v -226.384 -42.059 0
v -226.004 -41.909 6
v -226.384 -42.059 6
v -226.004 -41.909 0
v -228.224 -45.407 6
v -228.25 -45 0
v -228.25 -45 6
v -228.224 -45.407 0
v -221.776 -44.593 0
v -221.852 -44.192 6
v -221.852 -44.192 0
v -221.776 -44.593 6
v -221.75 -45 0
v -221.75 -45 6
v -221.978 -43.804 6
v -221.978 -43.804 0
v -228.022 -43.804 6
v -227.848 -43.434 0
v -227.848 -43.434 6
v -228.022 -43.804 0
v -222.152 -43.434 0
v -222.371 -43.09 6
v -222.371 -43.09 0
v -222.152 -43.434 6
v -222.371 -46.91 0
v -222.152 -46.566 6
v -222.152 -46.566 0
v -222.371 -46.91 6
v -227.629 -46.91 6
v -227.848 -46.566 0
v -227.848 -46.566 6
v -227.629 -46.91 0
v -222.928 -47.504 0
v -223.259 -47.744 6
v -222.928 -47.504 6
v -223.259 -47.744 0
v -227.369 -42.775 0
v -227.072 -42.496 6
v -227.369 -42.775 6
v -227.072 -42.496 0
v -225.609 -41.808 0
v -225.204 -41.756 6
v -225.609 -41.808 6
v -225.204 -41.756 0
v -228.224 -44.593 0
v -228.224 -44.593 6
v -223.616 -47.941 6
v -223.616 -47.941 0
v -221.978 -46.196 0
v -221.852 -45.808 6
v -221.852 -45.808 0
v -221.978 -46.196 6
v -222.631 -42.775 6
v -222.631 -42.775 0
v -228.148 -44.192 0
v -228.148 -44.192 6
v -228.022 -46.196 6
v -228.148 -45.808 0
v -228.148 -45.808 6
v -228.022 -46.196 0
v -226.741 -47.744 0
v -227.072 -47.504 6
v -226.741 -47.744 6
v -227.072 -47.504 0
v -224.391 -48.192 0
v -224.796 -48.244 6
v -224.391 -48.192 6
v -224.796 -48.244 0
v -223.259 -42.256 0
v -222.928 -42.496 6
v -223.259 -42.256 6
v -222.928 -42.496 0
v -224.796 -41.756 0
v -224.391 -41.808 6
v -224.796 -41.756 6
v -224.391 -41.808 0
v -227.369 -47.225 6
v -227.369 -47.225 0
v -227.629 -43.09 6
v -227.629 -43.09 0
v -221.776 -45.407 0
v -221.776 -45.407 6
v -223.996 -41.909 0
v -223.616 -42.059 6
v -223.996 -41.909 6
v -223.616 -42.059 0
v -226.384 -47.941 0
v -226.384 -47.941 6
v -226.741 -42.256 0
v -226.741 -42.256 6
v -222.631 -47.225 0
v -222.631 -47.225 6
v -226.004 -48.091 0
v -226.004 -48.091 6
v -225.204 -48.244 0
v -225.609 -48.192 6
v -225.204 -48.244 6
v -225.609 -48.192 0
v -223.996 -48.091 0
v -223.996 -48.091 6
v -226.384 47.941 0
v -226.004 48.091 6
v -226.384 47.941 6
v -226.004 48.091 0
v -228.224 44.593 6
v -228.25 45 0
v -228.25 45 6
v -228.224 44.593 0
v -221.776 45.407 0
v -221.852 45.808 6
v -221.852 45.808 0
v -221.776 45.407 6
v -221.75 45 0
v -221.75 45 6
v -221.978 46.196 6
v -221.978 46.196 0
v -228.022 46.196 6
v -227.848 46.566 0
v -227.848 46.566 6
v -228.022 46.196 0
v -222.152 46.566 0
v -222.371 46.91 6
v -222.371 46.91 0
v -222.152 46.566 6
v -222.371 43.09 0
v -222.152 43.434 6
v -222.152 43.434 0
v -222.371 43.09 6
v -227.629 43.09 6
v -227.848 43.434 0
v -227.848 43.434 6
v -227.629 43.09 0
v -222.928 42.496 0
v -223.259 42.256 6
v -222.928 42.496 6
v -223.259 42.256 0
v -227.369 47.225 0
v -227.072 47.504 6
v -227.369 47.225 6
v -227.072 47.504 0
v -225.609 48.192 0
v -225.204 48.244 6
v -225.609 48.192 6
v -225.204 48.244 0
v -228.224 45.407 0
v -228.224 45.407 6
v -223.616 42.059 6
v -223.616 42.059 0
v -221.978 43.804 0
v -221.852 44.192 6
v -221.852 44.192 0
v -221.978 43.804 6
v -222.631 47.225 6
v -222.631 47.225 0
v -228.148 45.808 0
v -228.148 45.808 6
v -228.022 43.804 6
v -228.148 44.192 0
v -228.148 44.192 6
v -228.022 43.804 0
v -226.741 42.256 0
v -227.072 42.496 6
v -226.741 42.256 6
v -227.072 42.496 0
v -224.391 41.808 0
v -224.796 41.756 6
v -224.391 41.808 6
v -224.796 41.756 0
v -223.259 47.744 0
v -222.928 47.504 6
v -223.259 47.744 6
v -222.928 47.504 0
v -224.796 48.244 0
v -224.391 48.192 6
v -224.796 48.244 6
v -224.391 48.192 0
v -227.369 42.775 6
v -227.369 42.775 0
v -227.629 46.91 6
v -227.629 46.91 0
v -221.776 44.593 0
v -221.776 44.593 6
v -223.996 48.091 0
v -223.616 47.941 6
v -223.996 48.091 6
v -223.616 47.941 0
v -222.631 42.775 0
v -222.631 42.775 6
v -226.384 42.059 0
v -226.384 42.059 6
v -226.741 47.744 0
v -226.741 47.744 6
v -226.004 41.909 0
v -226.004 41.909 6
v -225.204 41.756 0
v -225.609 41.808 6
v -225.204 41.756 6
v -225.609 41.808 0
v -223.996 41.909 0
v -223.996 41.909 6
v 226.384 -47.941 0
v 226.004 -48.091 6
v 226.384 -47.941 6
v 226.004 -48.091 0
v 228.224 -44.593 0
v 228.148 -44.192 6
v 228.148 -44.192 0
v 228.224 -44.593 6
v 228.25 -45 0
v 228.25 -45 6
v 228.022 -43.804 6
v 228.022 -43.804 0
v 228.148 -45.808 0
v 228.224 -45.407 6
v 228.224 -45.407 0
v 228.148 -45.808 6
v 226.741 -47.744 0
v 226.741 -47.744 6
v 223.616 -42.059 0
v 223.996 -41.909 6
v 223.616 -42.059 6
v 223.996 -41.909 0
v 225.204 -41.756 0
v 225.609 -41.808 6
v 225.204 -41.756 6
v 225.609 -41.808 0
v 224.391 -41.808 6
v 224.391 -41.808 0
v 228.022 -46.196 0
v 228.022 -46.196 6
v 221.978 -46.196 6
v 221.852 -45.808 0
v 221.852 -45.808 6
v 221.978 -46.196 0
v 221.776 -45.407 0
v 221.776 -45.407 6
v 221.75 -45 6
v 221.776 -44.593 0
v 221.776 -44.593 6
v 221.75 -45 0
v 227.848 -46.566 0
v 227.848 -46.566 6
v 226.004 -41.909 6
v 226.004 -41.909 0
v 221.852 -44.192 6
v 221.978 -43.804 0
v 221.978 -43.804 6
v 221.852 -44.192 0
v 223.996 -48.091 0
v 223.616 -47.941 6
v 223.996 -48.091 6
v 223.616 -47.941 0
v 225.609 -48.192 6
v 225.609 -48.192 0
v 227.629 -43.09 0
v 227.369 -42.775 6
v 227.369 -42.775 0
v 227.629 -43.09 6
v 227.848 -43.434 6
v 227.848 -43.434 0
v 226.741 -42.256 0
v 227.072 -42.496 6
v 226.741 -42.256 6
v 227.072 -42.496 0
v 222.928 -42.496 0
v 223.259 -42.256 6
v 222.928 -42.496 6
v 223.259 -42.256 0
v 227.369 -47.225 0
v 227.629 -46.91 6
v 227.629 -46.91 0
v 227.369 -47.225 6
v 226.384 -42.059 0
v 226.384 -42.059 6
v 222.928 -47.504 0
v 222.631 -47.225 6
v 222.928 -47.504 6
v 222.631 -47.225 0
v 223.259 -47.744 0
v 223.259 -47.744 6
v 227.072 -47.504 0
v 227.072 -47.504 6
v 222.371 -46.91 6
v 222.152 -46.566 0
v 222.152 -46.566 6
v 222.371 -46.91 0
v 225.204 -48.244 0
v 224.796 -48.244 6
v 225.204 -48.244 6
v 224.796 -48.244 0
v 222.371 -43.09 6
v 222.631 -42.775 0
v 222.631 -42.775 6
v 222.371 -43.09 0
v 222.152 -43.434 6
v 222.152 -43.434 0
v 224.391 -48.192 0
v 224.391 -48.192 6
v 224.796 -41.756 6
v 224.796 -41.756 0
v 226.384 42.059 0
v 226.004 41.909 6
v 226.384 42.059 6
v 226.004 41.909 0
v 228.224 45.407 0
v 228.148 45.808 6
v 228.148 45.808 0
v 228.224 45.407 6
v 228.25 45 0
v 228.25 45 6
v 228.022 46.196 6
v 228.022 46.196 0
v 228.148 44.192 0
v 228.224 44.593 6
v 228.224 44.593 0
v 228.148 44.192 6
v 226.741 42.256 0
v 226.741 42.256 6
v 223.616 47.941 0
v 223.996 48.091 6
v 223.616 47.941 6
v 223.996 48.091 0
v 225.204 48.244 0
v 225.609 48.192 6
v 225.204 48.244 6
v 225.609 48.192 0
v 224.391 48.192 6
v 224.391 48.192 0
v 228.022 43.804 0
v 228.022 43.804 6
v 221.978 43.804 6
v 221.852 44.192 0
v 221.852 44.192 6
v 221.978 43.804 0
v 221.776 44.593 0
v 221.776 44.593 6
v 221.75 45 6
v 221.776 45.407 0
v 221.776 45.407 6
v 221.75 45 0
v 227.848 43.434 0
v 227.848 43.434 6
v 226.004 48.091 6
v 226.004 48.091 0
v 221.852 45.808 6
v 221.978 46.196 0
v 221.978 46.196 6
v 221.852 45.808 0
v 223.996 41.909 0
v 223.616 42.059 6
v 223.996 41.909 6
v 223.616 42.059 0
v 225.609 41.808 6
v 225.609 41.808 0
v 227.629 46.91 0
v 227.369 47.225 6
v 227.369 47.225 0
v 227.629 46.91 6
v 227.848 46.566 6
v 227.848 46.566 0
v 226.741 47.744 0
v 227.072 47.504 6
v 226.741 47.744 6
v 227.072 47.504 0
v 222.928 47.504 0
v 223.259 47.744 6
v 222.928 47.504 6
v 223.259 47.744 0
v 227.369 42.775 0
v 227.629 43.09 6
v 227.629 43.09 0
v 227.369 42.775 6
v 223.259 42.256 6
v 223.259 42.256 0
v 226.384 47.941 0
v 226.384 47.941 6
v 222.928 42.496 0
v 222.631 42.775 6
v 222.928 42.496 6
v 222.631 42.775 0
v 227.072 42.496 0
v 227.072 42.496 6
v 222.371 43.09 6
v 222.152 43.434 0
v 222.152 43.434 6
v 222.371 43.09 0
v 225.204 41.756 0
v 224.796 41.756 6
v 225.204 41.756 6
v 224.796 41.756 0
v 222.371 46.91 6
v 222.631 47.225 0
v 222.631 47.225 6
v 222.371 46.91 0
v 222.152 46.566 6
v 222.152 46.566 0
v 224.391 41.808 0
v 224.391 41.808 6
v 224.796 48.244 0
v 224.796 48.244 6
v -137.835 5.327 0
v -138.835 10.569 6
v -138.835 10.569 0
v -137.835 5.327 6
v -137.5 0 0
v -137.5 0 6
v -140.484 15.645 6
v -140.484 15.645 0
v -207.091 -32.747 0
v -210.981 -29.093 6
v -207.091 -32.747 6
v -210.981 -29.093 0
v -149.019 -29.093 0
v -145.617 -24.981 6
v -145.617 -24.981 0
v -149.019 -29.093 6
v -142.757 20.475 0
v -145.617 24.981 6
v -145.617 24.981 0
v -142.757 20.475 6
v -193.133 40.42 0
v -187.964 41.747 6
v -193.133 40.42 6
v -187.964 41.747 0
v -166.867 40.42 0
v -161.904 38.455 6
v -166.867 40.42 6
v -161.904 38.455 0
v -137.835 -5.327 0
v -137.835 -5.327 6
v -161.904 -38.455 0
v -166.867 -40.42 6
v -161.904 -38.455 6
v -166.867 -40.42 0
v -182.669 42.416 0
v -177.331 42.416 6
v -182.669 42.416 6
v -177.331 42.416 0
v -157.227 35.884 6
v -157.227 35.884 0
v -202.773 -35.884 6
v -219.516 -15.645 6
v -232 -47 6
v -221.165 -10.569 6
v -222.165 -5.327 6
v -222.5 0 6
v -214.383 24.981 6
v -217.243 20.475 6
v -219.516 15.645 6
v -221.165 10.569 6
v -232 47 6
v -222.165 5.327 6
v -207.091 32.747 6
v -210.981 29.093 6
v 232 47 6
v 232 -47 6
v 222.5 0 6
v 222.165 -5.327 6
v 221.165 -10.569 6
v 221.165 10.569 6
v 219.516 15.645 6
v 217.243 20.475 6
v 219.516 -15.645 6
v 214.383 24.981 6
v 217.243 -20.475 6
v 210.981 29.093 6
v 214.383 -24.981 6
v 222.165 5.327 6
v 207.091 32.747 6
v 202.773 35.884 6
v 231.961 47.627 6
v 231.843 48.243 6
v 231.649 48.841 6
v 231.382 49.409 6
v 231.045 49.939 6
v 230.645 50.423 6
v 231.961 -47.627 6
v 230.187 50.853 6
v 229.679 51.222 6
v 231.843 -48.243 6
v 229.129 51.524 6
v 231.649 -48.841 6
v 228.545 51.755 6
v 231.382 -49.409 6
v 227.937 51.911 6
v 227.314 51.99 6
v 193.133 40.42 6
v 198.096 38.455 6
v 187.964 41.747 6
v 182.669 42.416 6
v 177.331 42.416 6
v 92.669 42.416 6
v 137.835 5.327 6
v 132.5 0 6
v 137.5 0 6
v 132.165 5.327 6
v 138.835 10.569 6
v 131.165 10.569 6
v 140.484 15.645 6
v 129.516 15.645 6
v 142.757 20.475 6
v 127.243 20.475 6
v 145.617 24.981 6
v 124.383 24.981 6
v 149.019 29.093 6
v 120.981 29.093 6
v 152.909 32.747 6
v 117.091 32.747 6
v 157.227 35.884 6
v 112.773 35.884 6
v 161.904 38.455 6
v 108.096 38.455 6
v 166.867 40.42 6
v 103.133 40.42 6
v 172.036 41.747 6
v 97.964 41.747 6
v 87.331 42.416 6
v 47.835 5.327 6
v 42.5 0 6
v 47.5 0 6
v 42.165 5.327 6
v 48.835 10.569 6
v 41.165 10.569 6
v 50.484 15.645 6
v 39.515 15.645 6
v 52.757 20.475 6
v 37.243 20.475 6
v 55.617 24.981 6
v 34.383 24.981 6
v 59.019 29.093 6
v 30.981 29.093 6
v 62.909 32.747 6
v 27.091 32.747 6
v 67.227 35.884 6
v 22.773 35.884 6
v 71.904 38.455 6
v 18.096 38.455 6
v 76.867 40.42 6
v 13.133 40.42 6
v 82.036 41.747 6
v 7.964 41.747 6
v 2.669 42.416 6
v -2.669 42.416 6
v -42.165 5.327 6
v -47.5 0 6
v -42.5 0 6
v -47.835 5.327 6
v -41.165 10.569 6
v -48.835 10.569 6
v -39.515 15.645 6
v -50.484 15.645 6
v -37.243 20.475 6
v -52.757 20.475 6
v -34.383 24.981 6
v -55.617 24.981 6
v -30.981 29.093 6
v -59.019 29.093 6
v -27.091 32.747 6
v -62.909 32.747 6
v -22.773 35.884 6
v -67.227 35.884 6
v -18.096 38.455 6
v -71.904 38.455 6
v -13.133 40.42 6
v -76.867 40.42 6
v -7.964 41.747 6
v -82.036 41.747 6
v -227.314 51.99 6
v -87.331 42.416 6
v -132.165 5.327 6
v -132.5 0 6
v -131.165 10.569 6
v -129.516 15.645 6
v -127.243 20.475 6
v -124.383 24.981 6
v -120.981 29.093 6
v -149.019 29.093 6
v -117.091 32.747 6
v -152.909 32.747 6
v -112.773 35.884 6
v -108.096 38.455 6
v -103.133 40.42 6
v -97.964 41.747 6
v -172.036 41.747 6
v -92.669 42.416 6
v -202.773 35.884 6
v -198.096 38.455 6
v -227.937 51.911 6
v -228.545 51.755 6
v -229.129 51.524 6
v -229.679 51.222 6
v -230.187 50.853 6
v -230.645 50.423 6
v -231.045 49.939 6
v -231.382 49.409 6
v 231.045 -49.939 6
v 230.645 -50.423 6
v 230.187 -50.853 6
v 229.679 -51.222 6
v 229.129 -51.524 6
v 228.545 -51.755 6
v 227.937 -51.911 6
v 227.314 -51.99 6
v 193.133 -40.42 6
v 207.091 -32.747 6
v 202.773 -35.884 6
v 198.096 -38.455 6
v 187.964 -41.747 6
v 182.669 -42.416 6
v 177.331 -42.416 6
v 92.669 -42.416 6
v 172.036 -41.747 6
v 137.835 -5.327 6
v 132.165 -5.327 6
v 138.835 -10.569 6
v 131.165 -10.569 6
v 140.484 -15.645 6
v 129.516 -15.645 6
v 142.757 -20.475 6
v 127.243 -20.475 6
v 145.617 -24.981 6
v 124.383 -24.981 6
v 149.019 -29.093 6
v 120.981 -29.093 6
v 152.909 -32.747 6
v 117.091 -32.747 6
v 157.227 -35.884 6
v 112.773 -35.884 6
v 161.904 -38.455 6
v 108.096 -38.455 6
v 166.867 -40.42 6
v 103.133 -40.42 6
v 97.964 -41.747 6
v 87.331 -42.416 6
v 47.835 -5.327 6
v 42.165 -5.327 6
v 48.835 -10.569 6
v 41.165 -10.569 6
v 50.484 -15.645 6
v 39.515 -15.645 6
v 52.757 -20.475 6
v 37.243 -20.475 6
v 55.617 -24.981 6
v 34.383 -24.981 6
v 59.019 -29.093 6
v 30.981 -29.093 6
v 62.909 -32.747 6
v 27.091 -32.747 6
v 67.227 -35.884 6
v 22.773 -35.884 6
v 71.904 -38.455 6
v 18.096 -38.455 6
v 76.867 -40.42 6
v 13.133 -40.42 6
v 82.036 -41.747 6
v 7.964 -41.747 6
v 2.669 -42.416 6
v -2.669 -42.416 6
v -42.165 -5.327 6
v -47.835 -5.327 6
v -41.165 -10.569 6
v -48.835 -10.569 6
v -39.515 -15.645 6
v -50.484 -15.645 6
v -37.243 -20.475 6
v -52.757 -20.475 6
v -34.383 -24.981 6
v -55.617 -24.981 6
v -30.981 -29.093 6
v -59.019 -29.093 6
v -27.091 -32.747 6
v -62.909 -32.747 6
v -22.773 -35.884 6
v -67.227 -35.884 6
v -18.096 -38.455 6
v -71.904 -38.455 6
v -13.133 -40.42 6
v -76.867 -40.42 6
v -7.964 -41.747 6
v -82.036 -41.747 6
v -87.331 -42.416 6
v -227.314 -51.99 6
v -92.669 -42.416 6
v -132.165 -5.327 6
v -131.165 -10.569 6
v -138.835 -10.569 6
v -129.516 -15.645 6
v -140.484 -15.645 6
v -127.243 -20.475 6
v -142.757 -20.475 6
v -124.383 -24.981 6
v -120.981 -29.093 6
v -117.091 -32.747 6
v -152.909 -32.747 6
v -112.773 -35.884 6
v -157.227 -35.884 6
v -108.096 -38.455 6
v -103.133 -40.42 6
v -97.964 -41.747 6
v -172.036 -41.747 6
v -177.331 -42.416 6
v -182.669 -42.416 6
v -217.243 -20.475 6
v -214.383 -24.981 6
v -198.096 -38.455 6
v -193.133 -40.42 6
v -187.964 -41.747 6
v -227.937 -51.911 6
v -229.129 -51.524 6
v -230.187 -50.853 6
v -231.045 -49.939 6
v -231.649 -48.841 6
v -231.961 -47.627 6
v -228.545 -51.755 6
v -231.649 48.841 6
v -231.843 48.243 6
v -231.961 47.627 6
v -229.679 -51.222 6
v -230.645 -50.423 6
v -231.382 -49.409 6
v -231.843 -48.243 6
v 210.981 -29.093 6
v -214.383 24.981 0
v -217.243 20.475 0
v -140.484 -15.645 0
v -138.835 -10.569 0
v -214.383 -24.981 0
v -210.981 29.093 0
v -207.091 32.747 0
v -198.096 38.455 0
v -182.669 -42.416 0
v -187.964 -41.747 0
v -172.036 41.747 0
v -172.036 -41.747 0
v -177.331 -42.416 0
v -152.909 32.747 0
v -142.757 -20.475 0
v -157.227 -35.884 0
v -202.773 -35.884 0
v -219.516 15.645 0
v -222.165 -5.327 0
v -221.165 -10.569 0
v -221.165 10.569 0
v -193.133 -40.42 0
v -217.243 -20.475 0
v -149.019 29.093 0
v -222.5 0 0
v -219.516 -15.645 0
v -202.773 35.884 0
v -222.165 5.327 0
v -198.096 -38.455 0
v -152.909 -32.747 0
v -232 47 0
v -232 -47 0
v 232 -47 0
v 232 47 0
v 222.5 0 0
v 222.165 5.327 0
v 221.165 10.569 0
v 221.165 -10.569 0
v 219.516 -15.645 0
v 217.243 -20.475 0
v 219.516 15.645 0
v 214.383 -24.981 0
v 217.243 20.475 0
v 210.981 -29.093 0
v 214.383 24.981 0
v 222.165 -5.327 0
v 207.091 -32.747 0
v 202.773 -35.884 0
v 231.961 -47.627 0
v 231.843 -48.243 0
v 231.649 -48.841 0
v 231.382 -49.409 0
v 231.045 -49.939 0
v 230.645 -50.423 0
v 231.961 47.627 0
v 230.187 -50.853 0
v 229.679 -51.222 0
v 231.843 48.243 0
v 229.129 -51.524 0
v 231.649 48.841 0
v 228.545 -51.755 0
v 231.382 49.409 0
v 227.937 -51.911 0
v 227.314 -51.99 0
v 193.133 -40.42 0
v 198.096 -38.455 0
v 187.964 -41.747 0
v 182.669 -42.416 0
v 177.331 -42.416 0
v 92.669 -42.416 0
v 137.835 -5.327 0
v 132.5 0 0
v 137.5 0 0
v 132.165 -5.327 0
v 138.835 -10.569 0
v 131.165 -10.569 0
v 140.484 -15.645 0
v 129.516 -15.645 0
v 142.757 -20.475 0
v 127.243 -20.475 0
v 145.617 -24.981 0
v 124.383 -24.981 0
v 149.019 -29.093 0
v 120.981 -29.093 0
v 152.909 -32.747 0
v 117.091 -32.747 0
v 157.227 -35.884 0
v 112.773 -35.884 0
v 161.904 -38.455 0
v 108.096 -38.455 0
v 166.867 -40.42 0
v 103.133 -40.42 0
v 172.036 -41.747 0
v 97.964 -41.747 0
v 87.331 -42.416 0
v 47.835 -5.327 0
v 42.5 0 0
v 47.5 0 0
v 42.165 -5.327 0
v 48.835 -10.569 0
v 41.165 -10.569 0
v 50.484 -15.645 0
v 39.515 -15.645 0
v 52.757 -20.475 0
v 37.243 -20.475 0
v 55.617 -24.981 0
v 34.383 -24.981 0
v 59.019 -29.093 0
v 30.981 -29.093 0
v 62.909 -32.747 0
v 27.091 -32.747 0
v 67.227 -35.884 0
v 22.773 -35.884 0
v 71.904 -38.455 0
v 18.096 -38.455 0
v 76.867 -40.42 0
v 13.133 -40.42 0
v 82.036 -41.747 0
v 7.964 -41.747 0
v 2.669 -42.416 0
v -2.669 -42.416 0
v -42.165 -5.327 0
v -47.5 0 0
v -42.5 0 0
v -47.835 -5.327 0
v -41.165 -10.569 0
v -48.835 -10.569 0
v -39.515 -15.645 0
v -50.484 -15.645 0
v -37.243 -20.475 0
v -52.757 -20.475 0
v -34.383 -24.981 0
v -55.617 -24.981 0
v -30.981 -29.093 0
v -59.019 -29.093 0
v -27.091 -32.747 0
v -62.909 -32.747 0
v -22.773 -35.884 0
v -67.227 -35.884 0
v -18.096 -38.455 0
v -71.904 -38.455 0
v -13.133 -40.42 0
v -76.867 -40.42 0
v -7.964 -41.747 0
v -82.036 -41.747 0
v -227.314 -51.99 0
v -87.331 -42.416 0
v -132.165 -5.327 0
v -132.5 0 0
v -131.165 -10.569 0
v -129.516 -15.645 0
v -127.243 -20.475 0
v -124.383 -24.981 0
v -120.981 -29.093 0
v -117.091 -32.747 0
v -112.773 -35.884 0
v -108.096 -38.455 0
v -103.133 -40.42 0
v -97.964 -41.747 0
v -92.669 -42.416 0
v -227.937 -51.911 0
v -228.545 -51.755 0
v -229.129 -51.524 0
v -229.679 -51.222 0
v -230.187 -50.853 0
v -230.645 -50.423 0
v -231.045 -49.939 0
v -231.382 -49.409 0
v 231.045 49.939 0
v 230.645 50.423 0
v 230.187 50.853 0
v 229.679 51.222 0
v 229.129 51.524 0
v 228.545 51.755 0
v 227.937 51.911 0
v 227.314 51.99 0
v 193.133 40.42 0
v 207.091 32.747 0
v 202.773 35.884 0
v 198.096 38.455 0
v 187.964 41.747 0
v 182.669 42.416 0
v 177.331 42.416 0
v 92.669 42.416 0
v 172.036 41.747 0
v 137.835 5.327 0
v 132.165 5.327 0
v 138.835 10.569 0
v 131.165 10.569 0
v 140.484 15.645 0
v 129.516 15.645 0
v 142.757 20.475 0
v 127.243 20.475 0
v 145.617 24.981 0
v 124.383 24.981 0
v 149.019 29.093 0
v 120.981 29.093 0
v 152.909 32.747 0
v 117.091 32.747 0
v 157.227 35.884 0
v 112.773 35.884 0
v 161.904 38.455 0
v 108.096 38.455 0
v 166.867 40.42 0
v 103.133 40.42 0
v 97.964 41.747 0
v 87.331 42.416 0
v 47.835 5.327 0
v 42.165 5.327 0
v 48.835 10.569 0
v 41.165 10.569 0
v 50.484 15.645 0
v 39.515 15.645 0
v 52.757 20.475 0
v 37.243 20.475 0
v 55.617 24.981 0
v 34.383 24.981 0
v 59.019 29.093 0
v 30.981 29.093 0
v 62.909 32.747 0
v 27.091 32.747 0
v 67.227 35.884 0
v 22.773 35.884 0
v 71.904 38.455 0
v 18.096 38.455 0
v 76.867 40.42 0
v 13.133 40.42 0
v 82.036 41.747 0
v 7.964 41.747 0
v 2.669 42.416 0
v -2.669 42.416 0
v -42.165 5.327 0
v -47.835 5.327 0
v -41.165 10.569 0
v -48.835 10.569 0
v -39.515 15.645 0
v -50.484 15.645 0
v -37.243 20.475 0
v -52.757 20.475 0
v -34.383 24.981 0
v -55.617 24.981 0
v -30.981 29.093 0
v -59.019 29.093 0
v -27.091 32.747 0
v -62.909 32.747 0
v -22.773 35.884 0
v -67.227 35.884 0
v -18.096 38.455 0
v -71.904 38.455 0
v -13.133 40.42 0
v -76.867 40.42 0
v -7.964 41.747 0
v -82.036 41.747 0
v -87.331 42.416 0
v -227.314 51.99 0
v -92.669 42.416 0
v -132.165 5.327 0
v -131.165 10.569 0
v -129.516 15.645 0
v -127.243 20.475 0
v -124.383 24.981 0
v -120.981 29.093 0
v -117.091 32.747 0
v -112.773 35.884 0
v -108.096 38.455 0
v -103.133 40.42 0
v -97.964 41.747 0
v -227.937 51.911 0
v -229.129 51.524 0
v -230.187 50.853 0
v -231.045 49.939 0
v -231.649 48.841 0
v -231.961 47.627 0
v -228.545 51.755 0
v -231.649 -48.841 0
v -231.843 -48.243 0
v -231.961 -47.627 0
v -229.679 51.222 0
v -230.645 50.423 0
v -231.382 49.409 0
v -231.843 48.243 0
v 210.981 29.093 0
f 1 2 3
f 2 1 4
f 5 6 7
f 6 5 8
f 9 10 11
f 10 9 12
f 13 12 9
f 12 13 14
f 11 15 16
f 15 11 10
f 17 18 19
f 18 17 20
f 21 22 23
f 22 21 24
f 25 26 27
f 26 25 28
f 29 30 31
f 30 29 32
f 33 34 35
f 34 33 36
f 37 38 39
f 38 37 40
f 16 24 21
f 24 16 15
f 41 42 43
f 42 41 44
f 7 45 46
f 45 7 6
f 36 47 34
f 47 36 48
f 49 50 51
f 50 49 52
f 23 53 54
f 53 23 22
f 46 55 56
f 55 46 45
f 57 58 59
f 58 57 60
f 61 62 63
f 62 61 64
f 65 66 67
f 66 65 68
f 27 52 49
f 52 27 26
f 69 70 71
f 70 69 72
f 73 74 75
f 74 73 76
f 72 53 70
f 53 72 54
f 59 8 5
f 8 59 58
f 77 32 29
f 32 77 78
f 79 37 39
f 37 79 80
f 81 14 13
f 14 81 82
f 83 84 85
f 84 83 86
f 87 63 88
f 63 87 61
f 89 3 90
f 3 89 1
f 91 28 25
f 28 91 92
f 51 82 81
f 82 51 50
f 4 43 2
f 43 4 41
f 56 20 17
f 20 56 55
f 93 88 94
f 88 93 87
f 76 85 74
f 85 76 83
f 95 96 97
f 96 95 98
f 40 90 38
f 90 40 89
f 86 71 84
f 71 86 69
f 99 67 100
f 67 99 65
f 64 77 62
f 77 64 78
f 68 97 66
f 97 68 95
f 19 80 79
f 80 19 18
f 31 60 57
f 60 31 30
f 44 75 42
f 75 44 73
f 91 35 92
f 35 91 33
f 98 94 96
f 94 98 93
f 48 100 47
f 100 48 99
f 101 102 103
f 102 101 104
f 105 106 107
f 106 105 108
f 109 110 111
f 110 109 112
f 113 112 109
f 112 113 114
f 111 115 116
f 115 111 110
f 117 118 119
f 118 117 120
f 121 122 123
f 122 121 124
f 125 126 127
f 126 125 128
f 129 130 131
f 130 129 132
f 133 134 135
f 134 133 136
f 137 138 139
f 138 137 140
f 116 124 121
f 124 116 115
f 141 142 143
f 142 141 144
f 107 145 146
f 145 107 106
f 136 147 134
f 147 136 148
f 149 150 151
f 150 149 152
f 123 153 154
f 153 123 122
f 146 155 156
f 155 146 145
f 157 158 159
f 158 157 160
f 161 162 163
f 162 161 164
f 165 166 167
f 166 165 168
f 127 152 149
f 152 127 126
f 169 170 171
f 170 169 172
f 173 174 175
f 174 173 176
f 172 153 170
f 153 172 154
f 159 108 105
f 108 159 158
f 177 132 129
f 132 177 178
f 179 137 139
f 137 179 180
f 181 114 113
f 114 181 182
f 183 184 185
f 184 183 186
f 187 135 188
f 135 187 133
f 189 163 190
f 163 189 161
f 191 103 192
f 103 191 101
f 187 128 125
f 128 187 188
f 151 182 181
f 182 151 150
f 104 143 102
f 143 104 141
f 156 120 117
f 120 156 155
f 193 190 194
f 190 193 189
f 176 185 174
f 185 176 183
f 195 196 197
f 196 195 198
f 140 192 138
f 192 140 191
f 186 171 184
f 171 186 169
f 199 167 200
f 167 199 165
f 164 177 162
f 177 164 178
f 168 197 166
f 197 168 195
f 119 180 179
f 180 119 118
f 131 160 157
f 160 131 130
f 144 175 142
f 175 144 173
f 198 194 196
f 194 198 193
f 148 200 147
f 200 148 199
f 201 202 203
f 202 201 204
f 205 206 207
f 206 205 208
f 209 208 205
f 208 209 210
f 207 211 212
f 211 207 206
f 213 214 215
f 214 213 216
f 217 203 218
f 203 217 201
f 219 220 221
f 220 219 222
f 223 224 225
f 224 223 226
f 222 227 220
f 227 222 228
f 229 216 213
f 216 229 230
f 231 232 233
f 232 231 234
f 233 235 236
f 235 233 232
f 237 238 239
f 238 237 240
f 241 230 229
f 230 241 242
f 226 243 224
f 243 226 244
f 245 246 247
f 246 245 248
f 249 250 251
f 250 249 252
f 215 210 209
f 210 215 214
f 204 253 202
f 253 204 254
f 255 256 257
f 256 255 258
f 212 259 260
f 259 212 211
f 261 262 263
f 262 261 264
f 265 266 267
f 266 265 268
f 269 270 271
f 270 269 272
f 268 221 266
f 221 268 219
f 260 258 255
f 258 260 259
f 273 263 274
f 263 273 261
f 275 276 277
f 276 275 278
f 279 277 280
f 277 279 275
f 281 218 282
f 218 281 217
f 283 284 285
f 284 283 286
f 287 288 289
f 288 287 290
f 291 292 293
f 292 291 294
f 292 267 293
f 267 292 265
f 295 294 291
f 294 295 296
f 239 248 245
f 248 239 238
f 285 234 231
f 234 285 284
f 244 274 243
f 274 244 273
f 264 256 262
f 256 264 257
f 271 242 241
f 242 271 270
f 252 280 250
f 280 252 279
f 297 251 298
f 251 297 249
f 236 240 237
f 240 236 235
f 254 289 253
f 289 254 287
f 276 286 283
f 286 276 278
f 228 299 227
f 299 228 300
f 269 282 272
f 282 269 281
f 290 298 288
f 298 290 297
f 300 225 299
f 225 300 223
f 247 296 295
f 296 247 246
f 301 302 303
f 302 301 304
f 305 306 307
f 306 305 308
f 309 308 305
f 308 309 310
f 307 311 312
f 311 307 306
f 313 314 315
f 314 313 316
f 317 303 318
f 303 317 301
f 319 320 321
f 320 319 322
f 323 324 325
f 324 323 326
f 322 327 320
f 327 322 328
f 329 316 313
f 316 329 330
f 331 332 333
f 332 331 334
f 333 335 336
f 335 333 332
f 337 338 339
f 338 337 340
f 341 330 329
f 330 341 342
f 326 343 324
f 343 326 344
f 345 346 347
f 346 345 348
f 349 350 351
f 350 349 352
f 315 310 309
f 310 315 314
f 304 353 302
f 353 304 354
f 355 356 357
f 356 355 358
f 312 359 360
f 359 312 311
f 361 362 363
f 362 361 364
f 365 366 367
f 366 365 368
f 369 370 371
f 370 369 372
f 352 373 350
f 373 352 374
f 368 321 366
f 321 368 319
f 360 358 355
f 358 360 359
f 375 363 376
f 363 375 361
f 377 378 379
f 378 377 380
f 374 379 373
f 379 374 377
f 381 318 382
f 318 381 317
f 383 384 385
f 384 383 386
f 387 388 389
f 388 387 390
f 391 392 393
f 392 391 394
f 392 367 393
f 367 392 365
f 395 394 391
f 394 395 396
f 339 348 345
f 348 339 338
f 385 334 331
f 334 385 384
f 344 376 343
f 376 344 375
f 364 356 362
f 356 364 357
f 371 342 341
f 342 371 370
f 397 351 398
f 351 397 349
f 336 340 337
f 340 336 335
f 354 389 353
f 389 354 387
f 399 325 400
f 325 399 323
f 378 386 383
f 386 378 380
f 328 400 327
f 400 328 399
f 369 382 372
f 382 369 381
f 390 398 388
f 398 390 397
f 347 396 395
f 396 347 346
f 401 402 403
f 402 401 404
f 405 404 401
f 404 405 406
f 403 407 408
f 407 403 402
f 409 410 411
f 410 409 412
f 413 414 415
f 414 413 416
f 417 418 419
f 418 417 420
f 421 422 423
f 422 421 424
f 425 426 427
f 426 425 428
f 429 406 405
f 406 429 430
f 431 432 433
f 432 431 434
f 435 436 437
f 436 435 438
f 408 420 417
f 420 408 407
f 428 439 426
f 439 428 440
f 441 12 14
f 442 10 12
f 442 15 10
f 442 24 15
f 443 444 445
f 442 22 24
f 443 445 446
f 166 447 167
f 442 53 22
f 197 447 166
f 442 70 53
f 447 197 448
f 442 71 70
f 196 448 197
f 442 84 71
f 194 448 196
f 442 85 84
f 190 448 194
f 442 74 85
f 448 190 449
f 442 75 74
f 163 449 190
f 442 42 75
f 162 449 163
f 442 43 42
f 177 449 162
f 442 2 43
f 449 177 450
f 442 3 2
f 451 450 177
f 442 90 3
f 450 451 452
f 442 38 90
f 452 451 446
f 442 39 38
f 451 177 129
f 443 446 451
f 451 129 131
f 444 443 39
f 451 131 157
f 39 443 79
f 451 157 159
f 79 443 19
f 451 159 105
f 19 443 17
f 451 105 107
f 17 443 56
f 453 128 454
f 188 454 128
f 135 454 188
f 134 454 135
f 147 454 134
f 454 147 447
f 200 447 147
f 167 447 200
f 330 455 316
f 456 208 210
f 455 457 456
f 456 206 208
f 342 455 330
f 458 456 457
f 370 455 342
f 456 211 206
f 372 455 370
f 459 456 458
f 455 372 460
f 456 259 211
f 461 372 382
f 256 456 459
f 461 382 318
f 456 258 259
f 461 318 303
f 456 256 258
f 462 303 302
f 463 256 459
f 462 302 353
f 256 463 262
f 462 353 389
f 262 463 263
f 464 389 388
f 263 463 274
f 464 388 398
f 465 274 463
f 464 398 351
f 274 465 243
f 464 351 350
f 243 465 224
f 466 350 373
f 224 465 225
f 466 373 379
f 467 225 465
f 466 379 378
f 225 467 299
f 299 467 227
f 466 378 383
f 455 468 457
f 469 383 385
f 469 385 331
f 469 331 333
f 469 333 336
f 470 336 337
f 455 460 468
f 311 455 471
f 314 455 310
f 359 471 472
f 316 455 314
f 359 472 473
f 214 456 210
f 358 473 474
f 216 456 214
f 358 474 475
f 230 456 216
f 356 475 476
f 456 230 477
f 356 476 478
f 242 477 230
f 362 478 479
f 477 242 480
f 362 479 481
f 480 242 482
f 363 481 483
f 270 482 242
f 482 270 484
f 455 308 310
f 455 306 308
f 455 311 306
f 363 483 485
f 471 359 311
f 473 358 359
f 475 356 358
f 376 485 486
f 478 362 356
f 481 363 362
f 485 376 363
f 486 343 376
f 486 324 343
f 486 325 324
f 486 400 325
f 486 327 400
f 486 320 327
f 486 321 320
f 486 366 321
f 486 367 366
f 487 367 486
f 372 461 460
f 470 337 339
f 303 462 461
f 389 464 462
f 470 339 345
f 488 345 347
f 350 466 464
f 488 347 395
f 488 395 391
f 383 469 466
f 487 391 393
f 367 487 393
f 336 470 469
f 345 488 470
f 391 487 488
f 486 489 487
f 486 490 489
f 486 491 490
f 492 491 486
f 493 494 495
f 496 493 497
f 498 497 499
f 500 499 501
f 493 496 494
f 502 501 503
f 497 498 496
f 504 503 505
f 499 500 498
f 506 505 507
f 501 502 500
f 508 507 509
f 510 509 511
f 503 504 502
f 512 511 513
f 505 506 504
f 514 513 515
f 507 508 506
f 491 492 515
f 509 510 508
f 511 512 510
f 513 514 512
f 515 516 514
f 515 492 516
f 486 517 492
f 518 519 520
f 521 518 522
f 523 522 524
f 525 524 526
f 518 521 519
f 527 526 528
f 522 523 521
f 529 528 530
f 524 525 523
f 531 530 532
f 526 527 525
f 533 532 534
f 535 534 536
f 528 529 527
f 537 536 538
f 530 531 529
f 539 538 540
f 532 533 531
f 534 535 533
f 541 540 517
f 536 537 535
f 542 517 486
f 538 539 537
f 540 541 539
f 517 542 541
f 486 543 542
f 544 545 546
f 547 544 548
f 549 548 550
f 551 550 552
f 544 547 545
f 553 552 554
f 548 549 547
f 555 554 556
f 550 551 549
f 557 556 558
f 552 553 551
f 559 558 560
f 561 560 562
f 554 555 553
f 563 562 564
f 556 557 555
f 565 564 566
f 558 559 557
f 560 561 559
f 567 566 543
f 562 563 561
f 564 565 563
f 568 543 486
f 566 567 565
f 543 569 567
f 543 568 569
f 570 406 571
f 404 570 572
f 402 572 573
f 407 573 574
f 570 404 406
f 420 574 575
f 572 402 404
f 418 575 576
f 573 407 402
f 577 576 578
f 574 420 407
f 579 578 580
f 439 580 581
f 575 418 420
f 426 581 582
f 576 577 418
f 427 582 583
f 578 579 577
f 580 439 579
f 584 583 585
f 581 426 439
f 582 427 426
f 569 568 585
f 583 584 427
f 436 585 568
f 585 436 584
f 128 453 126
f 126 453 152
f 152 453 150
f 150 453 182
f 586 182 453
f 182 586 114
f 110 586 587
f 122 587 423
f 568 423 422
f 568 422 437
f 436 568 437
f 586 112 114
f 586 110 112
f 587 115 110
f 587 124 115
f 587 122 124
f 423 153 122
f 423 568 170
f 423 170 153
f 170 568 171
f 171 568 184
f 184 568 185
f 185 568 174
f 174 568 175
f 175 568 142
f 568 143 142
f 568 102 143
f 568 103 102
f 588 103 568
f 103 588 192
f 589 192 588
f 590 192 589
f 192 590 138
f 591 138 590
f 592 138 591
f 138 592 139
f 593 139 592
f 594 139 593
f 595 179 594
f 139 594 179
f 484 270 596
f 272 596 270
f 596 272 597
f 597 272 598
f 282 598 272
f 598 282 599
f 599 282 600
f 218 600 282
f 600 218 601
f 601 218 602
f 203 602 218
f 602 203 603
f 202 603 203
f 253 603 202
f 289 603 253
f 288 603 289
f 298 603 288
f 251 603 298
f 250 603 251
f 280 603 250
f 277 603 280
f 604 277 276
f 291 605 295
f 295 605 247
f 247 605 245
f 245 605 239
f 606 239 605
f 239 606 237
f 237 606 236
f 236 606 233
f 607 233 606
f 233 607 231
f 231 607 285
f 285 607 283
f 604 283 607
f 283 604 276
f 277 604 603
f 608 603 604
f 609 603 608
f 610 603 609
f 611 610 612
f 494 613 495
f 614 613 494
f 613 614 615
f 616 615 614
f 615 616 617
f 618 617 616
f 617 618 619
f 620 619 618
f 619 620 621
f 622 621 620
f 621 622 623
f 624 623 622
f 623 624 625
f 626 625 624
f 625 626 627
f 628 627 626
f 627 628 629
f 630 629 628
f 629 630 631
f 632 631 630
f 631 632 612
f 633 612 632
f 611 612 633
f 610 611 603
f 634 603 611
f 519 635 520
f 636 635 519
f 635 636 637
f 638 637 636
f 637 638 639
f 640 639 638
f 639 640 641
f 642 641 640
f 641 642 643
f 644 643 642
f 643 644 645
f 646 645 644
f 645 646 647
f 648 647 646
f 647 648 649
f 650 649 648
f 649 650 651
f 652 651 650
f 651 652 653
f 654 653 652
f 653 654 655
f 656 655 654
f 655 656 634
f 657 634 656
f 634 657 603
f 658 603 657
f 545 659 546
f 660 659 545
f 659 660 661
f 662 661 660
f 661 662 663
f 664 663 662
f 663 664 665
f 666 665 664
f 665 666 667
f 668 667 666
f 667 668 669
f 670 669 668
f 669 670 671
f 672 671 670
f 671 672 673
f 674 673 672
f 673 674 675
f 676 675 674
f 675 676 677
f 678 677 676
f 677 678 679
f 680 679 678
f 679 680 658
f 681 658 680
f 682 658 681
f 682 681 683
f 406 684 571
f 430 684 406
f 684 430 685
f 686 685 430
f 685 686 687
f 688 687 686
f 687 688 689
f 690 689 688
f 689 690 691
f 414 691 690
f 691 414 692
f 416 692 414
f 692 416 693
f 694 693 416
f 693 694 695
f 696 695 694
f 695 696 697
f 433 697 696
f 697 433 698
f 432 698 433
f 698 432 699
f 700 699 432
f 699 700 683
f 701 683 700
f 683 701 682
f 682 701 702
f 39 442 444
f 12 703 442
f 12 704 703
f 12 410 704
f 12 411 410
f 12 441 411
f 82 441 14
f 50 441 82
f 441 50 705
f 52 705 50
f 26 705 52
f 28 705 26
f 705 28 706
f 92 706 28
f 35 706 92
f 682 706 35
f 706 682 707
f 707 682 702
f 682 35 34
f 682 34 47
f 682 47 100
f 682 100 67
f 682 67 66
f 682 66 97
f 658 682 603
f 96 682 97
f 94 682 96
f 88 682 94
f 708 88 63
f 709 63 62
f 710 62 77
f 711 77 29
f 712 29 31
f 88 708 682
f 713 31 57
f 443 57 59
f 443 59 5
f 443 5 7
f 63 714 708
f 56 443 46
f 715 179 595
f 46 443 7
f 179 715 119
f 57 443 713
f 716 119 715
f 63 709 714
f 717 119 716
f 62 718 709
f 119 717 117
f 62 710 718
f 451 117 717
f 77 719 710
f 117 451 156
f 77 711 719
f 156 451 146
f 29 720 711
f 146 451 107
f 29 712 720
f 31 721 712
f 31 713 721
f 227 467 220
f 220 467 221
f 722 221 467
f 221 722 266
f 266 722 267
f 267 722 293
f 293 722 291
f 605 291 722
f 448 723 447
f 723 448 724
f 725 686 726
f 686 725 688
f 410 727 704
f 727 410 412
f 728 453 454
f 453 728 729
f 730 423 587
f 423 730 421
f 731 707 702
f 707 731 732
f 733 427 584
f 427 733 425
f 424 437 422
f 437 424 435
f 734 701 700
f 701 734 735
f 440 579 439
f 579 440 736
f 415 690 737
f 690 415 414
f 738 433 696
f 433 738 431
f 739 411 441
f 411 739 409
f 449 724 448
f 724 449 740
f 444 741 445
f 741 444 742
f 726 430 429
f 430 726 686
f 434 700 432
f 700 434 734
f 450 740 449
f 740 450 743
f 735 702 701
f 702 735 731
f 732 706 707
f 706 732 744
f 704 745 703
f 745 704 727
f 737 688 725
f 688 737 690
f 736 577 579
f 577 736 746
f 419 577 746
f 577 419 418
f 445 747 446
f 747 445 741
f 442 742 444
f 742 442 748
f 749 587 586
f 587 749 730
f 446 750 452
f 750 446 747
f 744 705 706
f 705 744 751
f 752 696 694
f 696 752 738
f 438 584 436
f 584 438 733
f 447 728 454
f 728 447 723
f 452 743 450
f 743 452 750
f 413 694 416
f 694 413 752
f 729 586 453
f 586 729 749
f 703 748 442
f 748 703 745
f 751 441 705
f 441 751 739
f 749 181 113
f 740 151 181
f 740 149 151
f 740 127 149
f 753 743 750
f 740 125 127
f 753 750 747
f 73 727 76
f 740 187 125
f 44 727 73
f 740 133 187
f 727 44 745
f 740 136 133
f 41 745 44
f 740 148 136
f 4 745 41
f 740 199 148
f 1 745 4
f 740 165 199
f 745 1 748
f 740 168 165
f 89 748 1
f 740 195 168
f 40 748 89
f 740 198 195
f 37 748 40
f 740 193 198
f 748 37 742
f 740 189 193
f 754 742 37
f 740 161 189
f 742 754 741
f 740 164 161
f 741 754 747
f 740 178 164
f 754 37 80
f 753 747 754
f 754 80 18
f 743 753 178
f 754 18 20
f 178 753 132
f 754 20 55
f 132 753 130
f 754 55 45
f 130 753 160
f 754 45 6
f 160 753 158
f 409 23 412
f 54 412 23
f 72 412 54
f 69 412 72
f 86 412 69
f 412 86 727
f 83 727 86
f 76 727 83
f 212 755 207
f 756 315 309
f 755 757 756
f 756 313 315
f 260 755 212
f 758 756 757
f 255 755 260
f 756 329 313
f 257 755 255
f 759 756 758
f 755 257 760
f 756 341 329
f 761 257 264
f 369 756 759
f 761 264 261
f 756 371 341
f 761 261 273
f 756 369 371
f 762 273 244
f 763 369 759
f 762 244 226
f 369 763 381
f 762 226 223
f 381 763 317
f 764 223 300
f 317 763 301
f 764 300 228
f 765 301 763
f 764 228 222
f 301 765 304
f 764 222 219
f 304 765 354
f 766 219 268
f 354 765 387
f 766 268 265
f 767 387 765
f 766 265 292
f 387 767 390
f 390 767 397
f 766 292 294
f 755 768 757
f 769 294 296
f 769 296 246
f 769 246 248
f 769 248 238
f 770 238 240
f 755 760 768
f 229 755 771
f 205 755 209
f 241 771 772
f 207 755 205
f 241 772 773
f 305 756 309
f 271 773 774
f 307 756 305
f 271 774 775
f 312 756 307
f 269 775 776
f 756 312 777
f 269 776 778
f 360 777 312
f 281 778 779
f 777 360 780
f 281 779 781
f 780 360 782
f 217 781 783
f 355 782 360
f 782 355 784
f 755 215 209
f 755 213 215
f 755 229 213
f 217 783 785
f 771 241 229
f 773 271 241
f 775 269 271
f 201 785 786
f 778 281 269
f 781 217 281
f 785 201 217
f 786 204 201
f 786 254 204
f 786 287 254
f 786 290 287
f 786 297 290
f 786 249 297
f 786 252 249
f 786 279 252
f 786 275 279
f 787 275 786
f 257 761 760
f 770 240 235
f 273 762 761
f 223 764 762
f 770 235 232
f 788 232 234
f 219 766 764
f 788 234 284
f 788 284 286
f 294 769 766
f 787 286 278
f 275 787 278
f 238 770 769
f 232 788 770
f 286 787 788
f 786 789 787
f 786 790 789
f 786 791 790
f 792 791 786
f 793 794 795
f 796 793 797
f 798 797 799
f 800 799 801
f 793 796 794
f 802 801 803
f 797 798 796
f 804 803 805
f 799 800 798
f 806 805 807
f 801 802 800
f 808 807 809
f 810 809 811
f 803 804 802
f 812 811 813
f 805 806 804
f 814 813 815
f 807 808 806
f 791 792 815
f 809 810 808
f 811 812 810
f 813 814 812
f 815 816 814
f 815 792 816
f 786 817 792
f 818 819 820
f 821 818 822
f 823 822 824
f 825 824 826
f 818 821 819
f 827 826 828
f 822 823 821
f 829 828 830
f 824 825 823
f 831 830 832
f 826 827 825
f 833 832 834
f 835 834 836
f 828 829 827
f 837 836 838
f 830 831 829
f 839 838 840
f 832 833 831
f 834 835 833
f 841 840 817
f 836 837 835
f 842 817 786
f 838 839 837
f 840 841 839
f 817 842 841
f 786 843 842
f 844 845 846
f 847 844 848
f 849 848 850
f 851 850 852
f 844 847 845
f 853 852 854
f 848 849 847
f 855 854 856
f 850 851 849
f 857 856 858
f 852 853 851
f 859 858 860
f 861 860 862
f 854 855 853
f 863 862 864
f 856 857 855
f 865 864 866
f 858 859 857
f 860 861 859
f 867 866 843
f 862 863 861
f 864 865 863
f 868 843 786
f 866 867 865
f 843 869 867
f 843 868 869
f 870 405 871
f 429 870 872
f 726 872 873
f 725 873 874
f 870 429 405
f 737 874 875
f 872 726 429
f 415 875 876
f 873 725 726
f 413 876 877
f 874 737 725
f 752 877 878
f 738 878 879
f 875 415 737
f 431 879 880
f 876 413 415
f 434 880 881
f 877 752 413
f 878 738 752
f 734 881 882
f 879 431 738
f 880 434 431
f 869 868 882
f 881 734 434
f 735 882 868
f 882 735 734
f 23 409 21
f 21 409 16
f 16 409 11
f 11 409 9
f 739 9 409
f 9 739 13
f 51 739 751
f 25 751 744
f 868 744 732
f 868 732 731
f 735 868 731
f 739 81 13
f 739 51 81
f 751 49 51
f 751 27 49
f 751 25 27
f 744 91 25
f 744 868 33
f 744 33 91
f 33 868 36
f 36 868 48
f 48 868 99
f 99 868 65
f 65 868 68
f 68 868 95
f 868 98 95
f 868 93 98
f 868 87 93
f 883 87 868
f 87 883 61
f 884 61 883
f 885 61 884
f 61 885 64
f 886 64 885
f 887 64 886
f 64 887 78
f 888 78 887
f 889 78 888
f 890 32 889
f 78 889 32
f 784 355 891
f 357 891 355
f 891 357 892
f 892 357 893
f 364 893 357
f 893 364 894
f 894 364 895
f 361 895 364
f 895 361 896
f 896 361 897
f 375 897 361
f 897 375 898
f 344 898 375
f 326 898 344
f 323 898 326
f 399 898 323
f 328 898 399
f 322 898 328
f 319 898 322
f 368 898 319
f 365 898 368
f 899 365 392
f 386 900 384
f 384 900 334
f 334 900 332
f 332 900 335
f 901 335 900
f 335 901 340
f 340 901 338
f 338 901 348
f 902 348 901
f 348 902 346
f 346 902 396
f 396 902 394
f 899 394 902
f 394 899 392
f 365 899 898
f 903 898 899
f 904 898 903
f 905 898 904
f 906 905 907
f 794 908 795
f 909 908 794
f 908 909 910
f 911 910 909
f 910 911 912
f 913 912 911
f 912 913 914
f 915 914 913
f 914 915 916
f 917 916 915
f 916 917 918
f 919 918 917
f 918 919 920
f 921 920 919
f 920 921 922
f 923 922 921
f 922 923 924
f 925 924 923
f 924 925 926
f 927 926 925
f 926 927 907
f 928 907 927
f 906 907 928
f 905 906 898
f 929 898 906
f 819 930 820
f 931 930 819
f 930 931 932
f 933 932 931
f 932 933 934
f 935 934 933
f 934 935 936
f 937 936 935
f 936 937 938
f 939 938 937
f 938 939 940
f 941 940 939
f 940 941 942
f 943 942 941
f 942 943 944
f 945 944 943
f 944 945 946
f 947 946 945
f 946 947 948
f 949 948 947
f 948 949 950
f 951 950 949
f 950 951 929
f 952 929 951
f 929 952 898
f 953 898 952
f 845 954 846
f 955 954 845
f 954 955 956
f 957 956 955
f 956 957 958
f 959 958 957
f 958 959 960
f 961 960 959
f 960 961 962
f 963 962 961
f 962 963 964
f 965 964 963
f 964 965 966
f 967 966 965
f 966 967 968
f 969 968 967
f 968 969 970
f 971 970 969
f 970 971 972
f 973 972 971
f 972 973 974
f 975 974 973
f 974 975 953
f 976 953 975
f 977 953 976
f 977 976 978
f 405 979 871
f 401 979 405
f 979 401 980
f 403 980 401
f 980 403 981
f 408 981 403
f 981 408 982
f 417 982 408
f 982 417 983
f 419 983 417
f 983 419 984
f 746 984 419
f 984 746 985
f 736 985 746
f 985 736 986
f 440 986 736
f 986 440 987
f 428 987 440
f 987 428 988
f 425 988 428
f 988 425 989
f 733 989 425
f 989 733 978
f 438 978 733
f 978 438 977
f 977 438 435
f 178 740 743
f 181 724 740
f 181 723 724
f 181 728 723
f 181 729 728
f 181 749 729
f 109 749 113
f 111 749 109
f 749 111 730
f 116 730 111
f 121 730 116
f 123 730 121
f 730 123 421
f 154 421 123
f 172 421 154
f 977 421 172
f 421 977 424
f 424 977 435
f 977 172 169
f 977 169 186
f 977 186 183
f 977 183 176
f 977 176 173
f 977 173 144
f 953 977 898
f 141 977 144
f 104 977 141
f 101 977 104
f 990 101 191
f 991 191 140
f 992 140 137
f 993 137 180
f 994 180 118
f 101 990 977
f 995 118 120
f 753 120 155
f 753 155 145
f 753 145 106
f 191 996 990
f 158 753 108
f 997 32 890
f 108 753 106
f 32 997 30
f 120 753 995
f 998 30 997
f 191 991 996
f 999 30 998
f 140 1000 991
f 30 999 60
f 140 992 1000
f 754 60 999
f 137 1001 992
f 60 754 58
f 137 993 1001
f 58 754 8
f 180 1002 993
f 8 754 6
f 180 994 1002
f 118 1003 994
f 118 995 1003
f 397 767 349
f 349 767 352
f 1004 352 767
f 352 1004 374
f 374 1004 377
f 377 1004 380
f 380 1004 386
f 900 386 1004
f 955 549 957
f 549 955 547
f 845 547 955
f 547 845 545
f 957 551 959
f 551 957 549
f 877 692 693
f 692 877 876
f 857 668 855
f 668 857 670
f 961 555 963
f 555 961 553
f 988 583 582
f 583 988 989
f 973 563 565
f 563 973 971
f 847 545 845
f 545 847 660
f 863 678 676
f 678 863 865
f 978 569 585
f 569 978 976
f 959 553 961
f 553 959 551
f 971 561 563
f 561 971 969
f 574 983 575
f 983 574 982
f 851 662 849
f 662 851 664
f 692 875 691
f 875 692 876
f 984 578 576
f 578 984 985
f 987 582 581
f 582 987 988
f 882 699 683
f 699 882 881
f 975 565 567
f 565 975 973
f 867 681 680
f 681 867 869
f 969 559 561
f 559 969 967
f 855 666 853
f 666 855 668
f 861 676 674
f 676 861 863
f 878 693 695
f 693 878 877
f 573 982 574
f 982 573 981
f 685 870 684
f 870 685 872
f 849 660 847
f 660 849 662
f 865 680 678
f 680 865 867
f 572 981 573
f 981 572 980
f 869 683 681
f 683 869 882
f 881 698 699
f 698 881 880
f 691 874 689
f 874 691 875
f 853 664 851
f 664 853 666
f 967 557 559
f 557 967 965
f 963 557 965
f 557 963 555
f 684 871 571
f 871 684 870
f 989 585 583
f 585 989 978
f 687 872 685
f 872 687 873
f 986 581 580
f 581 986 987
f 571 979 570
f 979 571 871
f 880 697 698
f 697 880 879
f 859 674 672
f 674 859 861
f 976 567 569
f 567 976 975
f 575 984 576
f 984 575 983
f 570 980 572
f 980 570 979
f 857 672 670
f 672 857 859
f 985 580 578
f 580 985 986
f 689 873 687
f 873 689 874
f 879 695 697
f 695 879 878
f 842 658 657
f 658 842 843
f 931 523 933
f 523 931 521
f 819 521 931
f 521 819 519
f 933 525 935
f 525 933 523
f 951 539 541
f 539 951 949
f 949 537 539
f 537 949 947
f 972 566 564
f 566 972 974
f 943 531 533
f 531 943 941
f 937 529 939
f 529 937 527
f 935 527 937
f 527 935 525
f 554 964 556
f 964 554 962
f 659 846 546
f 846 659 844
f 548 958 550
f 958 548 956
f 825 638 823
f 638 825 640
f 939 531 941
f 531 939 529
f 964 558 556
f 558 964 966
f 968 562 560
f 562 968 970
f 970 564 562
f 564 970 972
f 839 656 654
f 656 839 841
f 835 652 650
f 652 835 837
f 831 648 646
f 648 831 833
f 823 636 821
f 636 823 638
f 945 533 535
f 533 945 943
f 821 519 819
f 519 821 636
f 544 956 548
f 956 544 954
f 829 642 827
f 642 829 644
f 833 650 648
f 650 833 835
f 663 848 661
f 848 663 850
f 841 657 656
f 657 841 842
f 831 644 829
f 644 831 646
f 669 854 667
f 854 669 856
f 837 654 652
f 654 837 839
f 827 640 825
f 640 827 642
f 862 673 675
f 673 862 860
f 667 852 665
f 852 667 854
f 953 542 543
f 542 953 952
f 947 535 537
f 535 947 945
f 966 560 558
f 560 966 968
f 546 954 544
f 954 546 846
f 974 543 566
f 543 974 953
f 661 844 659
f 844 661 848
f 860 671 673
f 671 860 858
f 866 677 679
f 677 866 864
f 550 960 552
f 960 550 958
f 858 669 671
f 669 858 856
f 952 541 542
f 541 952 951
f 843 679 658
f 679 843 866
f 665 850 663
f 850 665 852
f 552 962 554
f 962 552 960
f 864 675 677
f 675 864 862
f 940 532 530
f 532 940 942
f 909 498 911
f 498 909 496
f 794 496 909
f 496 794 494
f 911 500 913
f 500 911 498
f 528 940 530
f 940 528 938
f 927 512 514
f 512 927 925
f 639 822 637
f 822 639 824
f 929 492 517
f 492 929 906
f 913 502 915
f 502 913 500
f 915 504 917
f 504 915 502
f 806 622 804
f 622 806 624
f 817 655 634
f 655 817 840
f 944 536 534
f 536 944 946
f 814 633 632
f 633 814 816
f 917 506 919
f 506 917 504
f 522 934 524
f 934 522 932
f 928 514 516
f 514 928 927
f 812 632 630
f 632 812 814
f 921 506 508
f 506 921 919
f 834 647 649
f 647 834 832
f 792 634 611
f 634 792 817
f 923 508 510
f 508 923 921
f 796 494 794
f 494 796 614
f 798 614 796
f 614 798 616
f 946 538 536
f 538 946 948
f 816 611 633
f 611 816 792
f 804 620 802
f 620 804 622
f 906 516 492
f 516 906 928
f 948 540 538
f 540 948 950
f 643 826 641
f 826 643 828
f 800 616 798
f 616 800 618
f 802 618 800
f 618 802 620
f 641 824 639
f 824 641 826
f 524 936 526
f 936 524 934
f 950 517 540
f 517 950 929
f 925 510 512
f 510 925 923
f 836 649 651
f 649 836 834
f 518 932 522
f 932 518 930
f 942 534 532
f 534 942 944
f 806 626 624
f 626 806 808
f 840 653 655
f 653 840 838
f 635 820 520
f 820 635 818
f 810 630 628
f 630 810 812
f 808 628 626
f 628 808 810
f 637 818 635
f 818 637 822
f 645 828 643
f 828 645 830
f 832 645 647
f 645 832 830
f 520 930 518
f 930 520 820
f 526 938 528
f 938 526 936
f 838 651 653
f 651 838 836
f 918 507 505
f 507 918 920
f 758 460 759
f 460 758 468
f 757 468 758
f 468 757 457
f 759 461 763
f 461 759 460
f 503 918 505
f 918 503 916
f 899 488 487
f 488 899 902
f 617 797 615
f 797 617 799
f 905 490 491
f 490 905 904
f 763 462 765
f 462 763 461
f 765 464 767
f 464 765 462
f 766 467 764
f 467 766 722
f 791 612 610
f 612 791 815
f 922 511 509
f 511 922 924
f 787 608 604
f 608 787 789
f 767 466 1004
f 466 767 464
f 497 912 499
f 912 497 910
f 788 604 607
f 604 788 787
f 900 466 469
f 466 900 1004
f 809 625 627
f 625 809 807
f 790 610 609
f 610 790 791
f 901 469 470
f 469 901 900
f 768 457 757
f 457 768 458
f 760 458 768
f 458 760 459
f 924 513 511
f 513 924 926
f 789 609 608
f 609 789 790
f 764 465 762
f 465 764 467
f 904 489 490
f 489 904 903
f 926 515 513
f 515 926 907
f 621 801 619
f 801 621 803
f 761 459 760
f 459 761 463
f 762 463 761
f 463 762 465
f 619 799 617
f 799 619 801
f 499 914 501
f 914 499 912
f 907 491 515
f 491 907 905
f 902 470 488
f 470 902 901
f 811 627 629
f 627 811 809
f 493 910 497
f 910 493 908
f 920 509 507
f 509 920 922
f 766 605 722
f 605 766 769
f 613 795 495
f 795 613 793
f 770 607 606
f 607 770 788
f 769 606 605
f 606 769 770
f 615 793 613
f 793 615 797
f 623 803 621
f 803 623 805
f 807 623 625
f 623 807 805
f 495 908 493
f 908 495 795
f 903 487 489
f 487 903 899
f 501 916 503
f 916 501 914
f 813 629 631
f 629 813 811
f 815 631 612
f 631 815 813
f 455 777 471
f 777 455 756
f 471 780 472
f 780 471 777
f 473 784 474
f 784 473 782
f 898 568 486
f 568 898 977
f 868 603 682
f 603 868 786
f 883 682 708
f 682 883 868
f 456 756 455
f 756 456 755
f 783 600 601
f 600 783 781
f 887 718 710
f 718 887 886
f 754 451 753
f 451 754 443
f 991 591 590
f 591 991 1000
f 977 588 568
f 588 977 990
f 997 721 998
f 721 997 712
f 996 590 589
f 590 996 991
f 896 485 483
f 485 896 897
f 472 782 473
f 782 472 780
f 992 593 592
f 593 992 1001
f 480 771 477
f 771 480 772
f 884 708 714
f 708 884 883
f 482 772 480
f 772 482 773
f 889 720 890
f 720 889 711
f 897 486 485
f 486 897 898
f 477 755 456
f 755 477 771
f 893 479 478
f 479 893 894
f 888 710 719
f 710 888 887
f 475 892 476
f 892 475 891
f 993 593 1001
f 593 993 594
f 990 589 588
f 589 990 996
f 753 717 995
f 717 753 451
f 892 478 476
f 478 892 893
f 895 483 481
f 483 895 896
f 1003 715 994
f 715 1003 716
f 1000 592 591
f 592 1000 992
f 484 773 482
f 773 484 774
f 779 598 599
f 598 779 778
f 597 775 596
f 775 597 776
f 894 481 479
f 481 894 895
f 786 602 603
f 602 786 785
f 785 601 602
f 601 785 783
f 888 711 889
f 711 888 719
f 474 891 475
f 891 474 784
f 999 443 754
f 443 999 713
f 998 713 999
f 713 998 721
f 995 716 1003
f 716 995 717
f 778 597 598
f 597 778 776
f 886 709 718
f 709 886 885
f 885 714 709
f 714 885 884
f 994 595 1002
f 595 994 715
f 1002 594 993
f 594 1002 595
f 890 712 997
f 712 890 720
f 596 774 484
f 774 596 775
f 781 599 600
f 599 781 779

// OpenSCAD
$fn = 50;


difference() {
	union() {
		hull() {
			translate(v = [-227.0000000000, 47.0000000000, 0]) {
				cylinder(h = 6, r = 5);
			}
			translate(v = [227.0000000000, 47.0000000000, 0]) {
				cylinder(h = 6, r = 5);
			}
			translate(v = [-227.0000000000, -47.0000000000, 0]) {
				cylinder(h = 6, r = 5);
			}
			translate(v = [227.0000000000, -47.0000000000, 0]) {
				cylinder(h = 6, r = 5);
			}
		}
	}
	union() {
		#translate(v = [-225.0000000000, -45.0000000000, -100.0000000000]) {
			cylinder(h = 200, r = 3.2500000000);
		}
		#translate(v = [-225.0000000000, 45.0000000000, -100.0000000000]) {
			cylinder(h = 200, r = 3.2500000000);
		}
		#translate(v = [225.0000000000, -45.0000000000, -100.0000000000]) {
			cylinder(h = 200, r = 3.2500000000);
		}
		#translate(v = [225.0000000000, 45.0000000000, -100.0000000000]) {
			cylinder(h = 200, r = 3.2500000000);
		}
		#translate(v = [-180.0000000000, 0, 0]) {
			cylinder(h = 6, r = 42.5000000000);
		}
		#translate(v = [-90.0000000000, 0, 0]) {
			cylinder(h = 6, r = 42.5000000000);
		}
		#cylinder(h = 6, r = 42.5000000000);
		#translate(v = [90.0000000000, 0, 0]) {
			cylinder(h = 6, r = 42.5000000000);
		}
		#translate(v = [180.0000000000, 0, 0]) {
			cylinder(h = 6, r = 42.5000000000);
		}
	}
}
